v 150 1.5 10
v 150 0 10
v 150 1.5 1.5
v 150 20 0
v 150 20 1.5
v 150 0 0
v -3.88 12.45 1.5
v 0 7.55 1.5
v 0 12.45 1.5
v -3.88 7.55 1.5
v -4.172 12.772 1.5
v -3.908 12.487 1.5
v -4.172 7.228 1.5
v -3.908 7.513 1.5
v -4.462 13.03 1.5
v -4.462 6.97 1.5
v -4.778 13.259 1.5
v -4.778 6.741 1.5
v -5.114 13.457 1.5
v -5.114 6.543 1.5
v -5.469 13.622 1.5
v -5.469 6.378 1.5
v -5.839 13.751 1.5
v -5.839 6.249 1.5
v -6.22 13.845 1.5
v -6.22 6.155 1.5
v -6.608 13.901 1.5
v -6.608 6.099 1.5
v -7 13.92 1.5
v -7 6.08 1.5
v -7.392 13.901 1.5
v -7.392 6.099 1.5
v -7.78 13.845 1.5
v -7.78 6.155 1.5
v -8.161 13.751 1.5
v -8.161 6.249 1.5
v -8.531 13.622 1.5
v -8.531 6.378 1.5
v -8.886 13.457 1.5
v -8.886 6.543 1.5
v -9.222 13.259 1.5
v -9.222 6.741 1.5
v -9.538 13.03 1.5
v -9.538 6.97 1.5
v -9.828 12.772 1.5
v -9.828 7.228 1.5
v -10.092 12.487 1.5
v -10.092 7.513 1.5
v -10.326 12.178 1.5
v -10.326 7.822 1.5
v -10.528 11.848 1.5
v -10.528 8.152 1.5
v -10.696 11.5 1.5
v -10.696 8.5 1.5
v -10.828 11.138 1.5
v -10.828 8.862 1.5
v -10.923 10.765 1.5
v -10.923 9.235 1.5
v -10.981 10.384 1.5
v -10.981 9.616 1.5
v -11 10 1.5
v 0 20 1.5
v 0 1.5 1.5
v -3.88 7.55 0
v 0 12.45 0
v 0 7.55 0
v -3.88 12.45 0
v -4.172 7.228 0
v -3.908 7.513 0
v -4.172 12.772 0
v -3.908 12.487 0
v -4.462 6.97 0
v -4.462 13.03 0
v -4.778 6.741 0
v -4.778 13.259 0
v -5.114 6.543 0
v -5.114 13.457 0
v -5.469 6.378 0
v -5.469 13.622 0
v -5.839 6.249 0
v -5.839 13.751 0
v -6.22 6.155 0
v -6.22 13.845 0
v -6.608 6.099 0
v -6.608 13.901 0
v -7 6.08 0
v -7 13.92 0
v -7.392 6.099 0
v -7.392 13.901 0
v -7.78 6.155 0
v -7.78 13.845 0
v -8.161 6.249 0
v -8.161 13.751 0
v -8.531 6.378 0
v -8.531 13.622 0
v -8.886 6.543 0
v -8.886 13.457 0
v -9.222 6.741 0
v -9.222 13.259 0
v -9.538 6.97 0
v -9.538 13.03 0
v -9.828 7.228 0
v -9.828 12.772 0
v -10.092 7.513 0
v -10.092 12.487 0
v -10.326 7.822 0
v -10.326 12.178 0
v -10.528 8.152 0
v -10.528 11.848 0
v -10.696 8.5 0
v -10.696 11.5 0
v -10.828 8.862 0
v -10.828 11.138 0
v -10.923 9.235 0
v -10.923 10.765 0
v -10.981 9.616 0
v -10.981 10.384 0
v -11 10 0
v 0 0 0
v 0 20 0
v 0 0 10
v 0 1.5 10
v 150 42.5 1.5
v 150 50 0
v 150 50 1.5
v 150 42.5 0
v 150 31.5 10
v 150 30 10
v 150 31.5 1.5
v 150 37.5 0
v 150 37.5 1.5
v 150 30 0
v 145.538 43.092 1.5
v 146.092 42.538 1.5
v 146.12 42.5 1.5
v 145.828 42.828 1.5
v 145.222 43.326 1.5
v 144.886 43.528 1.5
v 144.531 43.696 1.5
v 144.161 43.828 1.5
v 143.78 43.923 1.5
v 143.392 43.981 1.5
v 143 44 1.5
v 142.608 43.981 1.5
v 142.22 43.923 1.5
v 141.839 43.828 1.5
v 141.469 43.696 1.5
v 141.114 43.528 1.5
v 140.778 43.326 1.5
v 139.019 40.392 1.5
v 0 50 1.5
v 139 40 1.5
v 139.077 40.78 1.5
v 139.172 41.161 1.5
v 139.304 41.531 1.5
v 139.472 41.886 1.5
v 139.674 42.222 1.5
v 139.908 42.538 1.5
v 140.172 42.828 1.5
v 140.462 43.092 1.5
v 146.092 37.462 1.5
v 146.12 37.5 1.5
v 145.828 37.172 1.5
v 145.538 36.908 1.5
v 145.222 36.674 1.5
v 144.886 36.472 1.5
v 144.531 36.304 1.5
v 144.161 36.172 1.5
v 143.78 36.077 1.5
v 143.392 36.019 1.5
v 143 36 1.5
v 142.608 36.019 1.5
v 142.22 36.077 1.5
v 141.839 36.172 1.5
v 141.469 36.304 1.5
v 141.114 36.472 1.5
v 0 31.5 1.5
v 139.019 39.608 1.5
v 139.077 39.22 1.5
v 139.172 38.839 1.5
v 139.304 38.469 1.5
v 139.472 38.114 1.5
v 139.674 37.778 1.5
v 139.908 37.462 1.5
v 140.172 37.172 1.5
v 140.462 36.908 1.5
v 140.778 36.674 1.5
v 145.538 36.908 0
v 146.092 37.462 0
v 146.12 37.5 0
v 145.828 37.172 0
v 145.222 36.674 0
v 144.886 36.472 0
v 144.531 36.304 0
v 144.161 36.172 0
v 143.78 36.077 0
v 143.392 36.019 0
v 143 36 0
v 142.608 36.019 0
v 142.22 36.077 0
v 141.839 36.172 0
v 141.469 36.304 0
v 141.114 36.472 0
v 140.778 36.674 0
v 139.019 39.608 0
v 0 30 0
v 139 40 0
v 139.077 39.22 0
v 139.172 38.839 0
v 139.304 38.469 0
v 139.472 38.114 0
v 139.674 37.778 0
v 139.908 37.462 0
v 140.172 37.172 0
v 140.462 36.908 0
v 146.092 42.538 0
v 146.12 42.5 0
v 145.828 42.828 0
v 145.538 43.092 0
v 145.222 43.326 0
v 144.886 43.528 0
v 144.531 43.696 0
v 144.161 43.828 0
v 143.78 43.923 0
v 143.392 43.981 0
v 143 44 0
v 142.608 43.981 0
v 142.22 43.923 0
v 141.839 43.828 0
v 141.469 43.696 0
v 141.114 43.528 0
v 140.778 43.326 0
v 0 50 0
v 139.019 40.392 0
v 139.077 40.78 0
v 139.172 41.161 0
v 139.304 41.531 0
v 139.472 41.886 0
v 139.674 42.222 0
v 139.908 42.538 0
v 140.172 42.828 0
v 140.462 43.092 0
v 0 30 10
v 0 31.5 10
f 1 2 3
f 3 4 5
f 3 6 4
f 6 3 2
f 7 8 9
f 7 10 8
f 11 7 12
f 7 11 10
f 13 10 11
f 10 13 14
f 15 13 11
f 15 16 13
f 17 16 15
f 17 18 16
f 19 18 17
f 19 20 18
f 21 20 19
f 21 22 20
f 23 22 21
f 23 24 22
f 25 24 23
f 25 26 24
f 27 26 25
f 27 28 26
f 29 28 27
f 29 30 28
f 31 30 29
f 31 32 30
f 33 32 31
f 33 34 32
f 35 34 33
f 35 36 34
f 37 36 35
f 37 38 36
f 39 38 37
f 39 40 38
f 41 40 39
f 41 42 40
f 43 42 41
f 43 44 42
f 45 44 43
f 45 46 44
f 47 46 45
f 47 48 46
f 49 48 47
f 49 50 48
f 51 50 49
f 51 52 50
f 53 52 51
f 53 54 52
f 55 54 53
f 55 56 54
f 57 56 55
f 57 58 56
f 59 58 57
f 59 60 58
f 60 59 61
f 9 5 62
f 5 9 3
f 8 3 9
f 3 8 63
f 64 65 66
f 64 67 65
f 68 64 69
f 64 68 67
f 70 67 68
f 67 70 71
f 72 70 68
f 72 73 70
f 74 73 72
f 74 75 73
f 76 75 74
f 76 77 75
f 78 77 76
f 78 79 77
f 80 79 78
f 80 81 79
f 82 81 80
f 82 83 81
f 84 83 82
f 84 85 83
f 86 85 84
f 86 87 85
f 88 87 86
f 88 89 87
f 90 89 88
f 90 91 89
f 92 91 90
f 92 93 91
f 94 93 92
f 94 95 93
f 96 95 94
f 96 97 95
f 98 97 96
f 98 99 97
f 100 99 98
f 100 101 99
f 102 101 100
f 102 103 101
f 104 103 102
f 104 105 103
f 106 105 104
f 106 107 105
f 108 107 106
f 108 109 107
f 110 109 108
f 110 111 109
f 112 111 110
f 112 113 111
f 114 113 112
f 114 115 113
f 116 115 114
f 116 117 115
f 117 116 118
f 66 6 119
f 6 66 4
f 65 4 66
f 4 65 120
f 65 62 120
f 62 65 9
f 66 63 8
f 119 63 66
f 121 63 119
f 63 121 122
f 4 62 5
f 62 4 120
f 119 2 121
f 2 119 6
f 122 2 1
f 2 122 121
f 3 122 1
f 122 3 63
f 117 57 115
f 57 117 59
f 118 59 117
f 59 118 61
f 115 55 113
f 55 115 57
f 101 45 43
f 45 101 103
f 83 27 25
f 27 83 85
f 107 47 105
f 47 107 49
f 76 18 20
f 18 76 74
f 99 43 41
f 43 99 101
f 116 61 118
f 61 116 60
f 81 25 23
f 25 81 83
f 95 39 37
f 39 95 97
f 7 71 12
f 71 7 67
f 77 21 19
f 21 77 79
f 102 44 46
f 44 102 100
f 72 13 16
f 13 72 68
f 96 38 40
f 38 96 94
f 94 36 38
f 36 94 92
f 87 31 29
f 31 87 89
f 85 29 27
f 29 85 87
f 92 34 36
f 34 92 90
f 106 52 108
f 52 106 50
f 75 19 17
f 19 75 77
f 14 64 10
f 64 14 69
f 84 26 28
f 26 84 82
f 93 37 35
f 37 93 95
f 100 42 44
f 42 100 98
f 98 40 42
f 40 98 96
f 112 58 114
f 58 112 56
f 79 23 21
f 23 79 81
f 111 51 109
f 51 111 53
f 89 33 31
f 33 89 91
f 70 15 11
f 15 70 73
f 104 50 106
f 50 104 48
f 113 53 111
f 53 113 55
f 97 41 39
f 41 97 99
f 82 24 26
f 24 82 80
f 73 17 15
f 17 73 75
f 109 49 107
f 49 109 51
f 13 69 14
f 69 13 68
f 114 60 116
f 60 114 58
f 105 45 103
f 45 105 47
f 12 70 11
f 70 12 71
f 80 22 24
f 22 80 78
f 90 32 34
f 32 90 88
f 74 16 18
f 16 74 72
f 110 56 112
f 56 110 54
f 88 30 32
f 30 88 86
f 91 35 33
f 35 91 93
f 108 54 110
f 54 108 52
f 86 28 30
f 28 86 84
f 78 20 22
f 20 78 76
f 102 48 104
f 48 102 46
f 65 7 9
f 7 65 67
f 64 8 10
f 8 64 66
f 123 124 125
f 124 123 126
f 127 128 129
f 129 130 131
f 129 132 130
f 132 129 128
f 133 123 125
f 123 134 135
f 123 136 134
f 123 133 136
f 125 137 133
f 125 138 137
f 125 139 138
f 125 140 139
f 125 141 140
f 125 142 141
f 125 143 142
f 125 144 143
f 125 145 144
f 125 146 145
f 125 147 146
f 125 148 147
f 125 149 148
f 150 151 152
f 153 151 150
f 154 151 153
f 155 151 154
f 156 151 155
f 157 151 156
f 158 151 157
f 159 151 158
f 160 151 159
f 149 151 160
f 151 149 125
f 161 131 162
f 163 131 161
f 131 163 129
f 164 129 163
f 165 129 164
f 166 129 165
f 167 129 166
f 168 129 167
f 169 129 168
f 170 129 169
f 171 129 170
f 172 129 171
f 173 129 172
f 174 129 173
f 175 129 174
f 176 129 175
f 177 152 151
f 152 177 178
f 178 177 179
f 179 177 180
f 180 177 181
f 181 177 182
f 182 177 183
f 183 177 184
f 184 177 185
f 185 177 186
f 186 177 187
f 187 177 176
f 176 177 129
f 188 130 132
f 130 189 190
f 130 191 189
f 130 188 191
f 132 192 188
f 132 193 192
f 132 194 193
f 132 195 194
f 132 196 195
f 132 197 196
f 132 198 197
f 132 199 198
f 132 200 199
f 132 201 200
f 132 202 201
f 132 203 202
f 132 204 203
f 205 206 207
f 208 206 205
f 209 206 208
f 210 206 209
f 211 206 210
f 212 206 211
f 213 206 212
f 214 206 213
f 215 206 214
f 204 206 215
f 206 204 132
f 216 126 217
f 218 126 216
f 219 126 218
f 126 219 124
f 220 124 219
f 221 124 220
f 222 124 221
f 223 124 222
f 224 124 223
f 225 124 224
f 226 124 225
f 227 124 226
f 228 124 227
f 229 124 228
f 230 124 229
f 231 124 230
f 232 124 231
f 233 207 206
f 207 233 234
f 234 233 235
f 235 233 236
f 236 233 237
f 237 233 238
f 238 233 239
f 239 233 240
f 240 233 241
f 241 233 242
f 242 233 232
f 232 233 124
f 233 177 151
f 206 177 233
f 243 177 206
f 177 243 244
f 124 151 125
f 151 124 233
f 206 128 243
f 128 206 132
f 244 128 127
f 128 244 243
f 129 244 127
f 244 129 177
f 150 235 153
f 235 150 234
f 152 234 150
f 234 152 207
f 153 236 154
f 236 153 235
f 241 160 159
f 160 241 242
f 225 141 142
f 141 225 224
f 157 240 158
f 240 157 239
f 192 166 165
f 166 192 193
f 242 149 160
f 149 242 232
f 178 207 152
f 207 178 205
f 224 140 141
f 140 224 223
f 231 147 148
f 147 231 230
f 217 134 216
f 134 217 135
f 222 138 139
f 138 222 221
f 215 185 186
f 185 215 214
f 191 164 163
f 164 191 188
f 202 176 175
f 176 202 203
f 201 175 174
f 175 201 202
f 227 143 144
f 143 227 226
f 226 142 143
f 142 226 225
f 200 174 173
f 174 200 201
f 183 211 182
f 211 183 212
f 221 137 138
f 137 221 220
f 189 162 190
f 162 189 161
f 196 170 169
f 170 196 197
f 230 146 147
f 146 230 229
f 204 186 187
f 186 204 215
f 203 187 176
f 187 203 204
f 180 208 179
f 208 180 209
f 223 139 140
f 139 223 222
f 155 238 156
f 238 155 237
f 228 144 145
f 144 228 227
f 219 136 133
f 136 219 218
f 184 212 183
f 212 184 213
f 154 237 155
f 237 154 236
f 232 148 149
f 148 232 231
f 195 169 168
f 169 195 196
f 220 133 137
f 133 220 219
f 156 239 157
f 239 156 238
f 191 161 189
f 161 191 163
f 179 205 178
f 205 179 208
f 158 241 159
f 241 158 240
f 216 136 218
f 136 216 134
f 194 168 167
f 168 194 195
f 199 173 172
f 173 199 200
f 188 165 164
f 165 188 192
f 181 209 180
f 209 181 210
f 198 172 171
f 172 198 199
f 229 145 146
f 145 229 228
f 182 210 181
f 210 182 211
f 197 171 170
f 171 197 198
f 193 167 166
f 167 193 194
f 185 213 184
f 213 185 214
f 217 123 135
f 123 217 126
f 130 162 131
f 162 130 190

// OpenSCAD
$fn = 64;

profile_thickness = 1.5;
profile_width = 20;
profile_height = 10;
profile_length = 150;

module peg() {
    translate([7, 0, 0]) cylinder(d = 8, h = profile_thickness);
    translate([0, -2.5, 0]) cube([5, 5, profile_thickness]);
}

module peg_male_right() {
    translate([profile_length, profile_width/2, 0]) scale([1, 0.98, 1]) peg();
}

module peg_male_left() {
    translate([0, profile_width/2, 0]) mirror([1, 0, 0]) scale([1, 0.98, 1]) peg();
}

module peg_female_right() {
    translate([profile_length, profile_width/2, -0.1]) mirror([1, 0, 0]) scale([1, 1, 1.2]) peg();
}

module peg_female_left() {
    translate([0, profile_width/2, -0.1]) scale([1, 1, 1.2]) peg();
}

module l_profile() {
    cube([profile_length, profile_width, profile_thickness]);
    cube([profile_length, profile_thickness, profile_height]);
}


module l_profile_part(peg_right, peg_left) {
    
    if(peg_right == "male" && peg_left == "female") {
        difference() {
            union() {
                l_profile();
                peg_male_right();                
            }
            peg_female_left();
        }
    } else if (peg_right == "male" && peg_left == "male") {
        l_profile();
        peg_male_right();
        peg_male_left();
    } else if (peg_right == "female" && peg_left == "female")  {
        difference() {
            l_profile();
            peg_female_right();
            peg_female_left();
        }
    } else if (peg_right == "female" && peg_left == "male") {
        difference() {
            union() {
                l_profile();
                peg_male_left();
            }
            peg_female_right();
        }
    } else if (peg_right == "none" && peg_left == "male") {
        l_profile();
        peg_male_left();
    } else if (peg_right == "none" && peg_left == "female") {
        difference() {
            l_profile();
            peg_female_left();
        }
    } else if (peg_right == "male" && peg_left == "none") {
        l_profile();
        peg_male_right();
    } else if (peg_right == "female" && peg_left == "none") {
        difference() {
            l_profile();
            peg_female_right();
        }
    } else if (peg_right == "none" && peg_left == "none") {
        l_profile();
    } else {
        echo ("<span style='font-weight:bold; color: red'>ERROR: You made an invalid choice for 'peg_right' and/or 'peg_left'. Valid settings are 'male', 'female', 'none'.</span>");
    }
}

l_profile_part("none", "male");
translate([0, profile_width + 10, 0]) l_profile_part("female", "none");
